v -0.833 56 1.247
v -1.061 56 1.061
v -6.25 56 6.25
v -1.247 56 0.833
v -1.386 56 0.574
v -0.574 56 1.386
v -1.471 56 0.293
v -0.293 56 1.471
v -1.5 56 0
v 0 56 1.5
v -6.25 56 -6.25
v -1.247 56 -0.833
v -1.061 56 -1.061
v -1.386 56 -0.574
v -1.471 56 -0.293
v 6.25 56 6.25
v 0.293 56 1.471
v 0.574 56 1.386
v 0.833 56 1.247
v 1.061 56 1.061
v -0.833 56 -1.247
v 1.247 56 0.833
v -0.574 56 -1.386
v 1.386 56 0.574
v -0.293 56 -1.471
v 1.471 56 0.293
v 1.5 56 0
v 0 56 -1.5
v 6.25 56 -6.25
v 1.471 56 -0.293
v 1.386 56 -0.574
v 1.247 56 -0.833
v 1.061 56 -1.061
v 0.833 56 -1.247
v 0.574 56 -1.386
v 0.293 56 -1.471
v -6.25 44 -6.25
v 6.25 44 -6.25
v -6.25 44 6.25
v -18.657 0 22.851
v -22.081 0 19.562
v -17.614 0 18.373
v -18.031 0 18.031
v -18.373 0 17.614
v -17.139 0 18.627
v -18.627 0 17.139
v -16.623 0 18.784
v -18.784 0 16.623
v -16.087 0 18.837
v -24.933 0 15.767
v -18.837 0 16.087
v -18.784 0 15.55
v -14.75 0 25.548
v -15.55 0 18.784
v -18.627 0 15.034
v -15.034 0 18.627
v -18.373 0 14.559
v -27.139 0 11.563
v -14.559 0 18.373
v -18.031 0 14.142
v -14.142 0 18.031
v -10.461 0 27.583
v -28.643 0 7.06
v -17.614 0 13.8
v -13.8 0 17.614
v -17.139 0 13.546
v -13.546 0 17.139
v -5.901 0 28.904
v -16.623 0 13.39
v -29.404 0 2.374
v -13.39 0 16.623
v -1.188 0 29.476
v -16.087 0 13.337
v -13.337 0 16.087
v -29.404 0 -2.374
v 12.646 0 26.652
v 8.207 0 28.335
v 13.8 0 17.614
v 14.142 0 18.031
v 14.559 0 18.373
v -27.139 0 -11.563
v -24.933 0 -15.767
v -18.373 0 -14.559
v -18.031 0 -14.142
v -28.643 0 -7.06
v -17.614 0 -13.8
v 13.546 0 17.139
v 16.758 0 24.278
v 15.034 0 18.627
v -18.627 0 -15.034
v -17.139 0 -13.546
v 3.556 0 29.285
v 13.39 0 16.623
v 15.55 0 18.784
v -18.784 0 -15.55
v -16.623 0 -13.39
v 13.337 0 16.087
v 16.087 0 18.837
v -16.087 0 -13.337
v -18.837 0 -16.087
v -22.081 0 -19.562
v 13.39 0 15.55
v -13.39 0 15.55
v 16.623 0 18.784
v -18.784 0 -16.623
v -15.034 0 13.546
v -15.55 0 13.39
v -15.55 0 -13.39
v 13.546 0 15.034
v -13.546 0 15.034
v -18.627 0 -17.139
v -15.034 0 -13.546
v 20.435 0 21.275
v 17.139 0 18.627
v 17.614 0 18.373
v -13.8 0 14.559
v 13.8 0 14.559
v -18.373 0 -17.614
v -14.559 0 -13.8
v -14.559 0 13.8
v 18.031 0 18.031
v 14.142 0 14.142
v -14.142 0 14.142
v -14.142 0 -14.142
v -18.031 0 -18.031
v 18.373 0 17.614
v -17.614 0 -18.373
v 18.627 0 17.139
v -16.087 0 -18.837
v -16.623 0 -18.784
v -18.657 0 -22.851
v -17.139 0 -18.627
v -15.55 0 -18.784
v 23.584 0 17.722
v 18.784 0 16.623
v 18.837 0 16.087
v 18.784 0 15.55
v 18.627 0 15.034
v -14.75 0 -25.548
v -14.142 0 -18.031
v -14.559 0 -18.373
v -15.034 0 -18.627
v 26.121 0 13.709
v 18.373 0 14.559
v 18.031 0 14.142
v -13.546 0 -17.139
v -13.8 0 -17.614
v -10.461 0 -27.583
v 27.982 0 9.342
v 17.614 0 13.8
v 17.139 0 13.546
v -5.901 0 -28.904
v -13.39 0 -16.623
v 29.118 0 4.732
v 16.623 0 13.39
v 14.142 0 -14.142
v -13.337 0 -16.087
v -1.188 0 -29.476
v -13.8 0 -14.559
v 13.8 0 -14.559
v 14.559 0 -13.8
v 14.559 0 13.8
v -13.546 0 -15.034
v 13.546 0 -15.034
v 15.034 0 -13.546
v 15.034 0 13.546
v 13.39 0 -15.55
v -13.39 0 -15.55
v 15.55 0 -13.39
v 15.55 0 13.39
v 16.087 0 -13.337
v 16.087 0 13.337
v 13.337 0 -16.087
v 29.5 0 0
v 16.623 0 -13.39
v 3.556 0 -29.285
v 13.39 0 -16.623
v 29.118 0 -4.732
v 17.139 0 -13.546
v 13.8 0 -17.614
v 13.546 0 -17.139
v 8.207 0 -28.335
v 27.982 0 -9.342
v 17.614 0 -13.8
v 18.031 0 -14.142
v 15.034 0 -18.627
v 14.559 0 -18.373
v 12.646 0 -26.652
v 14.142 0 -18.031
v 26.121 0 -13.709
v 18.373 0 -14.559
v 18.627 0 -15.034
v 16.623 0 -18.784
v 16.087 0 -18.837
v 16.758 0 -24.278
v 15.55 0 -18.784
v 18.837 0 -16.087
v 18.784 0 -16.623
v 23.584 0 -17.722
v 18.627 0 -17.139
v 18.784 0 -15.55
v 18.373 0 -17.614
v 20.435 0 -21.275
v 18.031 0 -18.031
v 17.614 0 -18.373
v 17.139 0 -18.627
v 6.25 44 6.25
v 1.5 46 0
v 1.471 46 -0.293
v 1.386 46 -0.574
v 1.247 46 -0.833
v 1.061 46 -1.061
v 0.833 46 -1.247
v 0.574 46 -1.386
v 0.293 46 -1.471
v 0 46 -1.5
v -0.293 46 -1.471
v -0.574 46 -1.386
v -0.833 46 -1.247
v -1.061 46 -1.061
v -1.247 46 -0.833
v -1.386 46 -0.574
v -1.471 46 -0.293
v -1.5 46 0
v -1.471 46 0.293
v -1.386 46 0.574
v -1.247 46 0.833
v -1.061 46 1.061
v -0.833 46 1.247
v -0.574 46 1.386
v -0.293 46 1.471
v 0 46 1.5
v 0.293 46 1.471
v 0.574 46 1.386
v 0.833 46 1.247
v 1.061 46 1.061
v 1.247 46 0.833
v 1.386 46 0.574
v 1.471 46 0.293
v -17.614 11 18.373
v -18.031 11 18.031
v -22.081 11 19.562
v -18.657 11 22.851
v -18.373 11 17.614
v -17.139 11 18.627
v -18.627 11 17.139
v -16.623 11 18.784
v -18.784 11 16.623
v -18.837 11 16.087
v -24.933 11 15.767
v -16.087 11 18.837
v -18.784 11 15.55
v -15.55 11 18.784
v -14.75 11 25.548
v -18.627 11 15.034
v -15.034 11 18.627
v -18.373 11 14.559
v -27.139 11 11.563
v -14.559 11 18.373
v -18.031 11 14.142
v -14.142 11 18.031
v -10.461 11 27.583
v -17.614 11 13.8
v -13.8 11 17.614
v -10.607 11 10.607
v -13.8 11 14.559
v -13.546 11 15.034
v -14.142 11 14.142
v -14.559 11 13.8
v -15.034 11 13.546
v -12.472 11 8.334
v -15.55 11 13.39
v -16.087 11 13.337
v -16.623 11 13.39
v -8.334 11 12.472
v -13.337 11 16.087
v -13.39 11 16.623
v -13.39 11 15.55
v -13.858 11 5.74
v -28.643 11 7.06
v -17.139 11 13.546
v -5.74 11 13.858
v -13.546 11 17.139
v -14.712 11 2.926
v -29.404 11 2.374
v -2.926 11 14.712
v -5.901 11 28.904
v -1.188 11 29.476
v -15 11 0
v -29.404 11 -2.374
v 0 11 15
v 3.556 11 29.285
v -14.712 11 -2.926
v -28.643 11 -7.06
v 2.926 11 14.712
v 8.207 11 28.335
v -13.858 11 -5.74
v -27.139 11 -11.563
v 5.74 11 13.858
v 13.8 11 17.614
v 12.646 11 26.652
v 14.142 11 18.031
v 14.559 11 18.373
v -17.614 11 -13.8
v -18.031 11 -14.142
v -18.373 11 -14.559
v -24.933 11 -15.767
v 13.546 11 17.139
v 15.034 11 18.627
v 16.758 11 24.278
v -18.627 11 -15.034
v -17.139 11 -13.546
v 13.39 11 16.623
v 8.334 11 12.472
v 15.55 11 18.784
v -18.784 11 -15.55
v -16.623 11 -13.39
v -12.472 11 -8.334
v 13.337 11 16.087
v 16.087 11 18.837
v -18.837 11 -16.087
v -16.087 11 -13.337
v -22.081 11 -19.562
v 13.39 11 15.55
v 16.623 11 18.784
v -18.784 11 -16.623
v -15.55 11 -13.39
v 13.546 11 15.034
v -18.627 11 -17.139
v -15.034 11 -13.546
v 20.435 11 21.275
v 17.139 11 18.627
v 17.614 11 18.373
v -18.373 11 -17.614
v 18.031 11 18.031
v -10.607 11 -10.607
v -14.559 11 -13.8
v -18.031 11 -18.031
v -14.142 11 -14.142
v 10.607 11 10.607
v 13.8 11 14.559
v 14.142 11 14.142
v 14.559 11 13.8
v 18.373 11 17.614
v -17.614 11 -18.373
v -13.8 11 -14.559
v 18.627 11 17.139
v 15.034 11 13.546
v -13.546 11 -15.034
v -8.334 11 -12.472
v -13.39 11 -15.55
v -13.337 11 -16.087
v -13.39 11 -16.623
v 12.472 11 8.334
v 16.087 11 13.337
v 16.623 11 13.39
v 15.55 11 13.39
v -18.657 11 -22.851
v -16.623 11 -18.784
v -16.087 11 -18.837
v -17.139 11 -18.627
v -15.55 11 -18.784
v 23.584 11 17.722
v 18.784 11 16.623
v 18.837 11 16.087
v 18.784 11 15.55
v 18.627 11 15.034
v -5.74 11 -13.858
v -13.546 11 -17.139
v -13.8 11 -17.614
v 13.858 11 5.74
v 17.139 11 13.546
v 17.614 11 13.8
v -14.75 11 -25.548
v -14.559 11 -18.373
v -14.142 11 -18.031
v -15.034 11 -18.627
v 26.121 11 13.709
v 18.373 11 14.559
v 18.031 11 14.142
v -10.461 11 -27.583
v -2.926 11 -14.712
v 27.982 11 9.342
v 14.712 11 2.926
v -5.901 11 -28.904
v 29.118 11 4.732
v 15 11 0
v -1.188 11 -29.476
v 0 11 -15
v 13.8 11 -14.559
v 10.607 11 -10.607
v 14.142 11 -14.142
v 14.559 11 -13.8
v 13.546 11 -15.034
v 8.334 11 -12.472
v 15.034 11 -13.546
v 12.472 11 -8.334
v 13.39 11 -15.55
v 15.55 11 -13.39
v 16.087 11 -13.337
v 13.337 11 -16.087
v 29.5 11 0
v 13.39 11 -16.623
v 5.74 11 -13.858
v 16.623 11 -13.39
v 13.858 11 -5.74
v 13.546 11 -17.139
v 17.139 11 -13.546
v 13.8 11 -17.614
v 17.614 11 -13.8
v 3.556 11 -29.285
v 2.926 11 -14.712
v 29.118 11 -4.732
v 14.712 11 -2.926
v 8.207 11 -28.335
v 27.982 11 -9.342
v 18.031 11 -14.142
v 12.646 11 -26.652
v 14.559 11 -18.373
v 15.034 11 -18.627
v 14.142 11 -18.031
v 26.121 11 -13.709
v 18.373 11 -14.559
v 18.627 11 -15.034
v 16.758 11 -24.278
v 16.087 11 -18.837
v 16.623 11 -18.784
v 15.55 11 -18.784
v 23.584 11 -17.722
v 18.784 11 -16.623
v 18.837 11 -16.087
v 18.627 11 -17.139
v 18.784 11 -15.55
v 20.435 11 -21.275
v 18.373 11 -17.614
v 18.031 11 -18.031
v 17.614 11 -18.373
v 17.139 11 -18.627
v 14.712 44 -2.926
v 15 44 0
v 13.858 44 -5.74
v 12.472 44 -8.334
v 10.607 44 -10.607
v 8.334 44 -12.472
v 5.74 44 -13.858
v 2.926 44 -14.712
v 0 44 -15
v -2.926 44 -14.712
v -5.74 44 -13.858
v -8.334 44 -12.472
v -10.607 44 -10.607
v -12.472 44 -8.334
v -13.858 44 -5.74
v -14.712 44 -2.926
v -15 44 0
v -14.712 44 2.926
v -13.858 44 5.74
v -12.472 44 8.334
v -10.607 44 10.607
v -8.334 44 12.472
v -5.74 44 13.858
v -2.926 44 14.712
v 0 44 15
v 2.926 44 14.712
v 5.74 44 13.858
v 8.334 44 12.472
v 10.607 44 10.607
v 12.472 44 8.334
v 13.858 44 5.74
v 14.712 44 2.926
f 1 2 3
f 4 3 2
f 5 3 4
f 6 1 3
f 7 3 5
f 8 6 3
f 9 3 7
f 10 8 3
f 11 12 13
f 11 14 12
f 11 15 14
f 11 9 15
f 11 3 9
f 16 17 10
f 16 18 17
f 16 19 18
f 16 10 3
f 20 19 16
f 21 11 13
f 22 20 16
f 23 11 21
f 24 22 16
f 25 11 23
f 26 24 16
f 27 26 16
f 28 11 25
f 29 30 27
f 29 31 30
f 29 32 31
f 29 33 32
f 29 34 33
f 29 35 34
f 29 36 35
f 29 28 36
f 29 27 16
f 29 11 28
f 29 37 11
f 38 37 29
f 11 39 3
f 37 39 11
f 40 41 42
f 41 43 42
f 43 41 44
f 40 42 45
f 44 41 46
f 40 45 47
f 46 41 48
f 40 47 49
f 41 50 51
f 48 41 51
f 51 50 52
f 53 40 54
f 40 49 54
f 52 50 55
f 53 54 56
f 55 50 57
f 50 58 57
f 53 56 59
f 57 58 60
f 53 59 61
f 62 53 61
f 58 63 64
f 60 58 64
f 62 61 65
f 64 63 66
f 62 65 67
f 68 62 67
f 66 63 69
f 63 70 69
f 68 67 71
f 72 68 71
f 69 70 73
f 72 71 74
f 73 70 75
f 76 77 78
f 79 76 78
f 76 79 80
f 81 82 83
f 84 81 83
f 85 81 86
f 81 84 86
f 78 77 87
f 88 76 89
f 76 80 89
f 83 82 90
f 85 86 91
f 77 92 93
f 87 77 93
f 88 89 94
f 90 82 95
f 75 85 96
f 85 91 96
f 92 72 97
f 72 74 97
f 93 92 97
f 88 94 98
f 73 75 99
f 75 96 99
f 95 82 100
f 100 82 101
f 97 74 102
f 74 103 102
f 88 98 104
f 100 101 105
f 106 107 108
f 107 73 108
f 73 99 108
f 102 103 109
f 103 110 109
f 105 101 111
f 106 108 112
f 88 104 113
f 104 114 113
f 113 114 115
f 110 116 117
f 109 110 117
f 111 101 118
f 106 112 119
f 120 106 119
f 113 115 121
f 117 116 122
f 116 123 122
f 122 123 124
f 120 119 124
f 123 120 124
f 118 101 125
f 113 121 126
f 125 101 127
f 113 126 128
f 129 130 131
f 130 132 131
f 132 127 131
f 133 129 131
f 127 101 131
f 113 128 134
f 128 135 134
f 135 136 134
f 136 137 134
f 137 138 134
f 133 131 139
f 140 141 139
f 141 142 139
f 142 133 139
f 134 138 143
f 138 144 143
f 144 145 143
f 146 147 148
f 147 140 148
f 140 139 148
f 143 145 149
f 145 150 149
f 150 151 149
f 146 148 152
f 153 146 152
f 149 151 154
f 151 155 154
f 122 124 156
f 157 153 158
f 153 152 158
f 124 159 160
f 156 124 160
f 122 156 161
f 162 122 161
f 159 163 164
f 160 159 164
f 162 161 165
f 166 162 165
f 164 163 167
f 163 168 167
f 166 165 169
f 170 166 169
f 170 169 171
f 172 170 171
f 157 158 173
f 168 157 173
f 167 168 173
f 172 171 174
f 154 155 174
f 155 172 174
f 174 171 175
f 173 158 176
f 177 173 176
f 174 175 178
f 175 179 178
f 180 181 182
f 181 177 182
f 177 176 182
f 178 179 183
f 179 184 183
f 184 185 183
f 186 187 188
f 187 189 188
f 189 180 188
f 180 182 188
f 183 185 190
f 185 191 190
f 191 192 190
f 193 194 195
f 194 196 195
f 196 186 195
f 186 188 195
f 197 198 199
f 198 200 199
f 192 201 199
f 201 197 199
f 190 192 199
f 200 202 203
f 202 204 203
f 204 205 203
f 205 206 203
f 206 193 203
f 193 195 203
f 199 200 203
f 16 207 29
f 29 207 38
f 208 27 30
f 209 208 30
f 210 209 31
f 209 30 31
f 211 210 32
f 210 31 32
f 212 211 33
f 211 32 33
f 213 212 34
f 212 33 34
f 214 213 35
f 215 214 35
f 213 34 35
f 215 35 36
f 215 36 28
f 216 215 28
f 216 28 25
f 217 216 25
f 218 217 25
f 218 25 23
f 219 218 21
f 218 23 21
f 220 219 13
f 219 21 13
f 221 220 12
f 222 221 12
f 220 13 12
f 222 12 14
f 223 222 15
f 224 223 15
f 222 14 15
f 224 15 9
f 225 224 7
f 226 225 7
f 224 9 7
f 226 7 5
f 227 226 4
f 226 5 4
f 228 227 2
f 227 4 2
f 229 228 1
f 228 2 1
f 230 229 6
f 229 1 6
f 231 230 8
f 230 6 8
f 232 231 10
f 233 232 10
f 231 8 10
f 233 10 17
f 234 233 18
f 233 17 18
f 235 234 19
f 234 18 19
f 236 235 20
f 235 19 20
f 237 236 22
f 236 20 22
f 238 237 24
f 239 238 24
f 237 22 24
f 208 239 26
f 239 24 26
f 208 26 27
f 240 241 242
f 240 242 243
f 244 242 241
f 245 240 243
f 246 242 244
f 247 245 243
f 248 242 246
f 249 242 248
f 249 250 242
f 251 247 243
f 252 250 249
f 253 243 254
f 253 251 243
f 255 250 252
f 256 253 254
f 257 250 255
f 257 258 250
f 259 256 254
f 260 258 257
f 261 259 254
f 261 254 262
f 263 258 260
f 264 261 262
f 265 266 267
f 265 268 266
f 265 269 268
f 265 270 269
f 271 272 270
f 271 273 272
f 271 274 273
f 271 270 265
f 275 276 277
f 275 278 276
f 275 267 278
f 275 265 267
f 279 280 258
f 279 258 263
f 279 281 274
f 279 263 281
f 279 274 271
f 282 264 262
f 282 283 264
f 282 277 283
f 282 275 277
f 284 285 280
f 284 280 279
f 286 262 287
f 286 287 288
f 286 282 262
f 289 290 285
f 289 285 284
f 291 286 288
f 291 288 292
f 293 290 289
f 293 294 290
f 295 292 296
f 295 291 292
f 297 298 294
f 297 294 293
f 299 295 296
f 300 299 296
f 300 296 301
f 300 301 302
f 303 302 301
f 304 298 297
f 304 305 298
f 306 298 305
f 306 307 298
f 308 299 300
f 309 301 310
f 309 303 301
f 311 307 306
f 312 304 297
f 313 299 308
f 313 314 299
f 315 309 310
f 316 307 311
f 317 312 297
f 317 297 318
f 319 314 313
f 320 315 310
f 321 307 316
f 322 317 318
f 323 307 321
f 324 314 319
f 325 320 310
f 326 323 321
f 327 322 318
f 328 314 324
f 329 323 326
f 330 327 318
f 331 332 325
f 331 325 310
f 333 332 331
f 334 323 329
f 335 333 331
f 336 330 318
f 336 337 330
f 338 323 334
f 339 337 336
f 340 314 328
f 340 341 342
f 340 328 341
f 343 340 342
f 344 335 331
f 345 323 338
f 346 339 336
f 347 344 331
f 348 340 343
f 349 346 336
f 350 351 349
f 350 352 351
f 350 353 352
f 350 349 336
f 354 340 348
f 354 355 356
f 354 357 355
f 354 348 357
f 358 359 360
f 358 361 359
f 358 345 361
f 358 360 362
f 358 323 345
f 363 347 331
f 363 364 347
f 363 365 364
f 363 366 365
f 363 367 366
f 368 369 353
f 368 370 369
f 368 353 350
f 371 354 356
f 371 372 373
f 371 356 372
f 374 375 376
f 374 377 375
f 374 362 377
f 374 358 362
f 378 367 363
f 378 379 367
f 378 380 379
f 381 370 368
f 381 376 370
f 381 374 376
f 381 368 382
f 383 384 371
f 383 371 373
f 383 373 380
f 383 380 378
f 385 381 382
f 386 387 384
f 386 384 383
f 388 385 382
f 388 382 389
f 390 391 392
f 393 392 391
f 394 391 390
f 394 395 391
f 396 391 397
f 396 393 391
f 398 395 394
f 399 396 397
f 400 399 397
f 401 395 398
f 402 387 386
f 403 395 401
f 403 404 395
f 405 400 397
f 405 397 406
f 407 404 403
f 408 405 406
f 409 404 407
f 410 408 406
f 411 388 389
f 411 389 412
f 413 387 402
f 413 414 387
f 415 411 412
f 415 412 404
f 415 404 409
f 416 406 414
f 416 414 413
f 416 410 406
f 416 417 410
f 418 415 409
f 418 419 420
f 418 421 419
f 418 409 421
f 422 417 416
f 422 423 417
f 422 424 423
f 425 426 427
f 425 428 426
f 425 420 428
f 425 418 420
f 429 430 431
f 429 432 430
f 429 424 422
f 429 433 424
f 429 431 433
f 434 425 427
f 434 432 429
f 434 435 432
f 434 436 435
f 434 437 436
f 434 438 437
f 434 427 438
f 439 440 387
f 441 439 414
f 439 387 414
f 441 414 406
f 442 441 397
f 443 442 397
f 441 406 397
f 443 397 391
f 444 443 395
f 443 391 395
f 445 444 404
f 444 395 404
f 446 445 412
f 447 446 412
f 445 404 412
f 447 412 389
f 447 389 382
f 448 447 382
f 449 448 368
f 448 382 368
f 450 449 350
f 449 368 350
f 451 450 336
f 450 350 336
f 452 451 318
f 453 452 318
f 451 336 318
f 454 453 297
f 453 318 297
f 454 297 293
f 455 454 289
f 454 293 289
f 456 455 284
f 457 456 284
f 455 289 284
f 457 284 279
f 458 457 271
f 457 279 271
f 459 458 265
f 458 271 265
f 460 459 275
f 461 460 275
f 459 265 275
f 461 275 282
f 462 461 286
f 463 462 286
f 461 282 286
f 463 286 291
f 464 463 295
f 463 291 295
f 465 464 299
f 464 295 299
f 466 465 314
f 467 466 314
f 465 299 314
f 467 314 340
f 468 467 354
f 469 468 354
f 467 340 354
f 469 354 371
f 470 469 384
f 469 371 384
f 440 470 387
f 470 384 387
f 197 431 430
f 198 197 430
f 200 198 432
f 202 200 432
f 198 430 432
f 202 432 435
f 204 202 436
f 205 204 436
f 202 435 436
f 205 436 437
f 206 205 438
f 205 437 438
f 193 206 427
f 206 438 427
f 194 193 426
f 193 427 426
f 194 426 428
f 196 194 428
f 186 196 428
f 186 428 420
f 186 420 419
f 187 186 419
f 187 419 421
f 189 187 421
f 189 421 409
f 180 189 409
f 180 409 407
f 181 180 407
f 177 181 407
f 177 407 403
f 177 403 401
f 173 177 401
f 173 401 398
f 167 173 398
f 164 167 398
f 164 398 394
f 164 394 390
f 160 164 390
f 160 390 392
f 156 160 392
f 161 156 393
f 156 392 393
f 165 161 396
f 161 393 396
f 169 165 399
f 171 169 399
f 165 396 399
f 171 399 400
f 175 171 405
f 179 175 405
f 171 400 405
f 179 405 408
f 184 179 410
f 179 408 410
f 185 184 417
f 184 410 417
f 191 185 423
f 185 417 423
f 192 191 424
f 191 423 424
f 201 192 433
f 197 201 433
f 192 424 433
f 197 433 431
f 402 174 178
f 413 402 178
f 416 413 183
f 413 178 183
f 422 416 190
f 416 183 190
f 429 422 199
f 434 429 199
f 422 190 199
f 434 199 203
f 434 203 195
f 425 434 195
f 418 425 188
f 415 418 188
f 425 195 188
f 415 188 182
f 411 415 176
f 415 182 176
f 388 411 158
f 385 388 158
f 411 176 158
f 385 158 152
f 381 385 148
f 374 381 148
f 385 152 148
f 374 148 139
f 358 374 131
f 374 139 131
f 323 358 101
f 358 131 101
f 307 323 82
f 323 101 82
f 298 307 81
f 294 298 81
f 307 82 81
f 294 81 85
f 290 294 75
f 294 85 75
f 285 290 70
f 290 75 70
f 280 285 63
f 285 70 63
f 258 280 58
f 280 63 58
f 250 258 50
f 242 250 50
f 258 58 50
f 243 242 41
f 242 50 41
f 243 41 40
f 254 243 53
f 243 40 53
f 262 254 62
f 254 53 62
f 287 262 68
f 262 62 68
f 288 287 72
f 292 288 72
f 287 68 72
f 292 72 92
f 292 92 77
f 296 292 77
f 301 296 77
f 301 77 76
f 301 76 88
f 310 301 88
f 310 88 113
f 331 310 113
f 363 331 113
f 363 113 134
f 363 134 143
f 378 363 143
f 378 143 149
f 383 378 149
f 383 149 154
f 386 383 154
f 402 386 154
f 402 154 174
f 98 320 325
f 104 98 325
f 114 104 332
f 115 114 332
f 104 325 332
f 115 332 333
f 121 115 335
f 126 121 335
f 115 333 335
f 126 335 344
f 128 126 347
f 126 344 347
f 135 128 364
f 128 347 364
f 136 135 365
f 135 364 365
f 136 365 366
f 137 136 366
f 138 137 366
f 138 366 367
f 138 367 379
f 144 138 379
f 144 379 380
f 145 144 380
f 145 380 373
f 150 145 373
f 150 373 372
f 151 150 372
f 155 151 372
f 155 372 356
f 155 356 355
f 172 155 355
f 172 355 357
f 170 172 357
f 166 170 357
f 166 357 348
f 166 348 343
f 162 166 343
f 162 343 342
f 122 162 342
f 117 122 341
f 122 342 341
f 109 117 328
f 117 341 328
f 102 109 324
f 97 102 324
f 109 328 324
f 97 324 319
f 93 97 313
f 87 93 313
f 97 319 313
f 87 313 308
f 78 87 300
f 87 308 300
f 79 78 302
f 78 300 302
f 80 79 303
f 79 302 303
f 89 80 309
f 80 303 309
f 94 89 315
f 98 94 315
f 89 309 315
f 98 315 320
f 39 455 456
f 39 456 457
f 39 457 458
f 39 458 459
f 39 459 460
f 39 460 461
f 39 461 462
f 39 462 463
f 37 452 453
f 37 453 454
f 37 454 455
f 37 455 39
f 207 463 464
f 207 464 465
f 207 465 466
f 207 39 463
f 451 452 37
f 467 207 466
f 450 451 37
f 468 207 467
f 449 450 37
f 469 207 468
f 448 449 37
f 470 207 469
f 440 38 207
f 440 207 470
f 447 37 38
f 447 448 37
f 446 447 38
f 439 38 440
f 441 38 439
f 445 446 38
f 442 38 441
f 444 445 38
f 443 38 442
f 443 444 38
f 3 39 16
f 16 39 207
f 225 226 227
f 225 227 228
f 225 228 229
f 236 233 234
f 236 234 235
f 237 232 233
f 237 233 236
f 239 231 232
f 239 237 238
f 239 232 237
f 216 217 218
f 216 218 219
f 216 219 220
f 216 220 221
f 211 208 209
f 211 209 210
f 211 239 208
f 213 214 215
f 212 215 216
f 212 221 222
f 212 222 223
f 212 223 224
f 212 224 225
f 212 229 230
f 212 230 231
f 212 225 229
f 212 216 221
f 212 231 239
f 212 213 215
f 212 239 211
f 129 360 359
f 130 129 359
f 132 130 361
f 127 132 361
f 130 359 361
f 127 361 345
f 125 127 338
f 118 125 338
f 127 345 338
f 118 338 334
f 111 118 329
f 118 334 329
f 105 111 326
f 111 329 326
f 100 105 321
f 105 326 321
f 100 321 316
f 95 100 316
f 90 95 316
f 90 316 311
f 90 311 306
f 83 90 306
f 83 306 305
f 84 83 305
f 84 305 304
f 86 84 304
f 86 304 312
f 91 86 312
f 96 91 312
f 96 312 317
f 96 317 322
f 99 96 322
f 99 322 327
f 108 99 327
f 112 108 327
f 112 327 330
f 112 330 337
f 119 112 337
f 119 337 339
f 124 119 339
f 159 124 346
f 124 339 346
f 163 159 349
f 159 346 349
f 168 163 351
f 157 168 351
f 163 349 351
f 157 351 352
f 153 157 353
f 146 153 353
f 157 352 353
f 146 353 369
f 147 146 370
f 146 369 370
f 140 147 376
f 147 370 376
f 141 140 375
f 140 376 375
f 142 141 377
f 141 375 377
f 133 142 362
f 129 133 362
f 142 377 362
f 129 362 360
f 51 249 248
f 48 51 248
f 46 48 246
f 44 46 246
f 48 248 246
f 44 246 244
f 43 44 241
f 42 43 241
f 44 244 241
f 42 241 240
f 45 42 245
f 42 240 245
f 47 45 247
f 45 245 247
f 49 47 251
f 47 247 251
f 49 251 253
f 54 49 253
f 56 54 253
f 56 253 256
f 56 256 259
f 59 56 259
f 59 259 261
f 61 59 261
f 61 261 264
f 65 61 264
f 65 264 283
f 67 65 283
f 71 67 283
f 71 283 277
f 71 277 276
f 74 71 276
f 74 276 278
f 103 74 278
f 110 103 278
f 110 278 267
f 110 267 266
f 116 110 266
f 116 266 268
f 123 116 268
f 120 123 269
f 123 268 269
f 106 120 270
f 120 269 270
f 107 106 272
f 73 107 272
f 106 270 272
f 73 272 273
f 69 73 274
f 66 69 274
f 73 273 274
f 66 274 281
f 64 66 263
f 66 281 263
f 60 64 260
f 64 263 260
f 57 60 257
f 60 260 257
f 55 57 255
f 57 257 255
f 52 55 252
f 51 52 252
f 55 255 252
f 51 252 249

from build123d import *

# Parameters (mm, degrees)
SKETCH_1_R               = 29.5
EXTRUDE_1_DEPTH          = 11
SKETCH_2_R               = 15
EXTRUDE_2_DEPTH          = 33
SKETCH_3_W               = 12.5
SKETCH_3_H               = 12.5
EXTRUDE_3_DEPTH          = 12
SKETCH_4_R               = 2.75
CUT_EXTRUDE_1_DEPTH      = 12
PATTERN_CIRCULAR_1_COUNT = 4
SKETCH_5_R               = 1.5
CUT_EXTRUDE_2_DEPTH      = 10


with BuildPart() as part:
    # 草图1 → 凸台-拉伸1 (new body)
    with BuildSketch(Plane(origin=(0, 0, 0), x_dir=(1, 0, 0), z_dir=(0, 1, 0))):
        Circle(SKETCH_1_R)
    extrude(amount=EXTRUDE_1_DEPTH)

    # 草图2 → 凸台-拉伸2 (add)
    with BuildSketch(Plane(origin=(0, 11, 0), x_dir=(1, 0, 0), z_dir=(0, 1, 0))):
        Circle(SKETCH_2_R)
    extrude(amount=EXTRUDE_2_DEPTH)

    # 草图3 → 凸台-拉伸3 (add)
    with BuildSketch(Plane(origin=(0, 44, 0), x_dir=(1, 0, 0), z_dir=(0, 1, 0))):
        Rectangle(SKETCH_3_W, SKETCH_3_H)
    extrude(amount=EXTRUDE_3_DEPTH)

    # 草图4 → 切除-拉伸1 (cut)
    with BuildSketch(Plane(origin=(0, 11, 0), x_dir=(1, 0, 0), z_dir=(0, 1, 0))):
        with Locations((16.086679272, 16.086679272)):
            Circle(SKETCH_4_R)
    cut_extrude_1 = extrude(amount=-CUT_EXTRUDE_1_DEPTH, mode=Mode.SUBTRACT)

    # 阵列(圆周)1: 切除-拉伸1 ×4 about axis
    pattern_circular_1_axis = Axis((0, 0, 0), (0, 1, 0))
    for i in range(1, PATTERN_CIRCULAR_1_COUNT):
        add(cut_extrude_1.rotate(pattern_circular_1_axis, i * 360 / PATTERN_CIRCULAR_1_COUNT), mode=Mode.SUBTRACT)

    # 草图5 → 切除-拉伸2 (cut)
    with BuildSketch(Plane(origin=(0, 56, 0), x_dir=(1, 0, 0), z_dir=(0, 1, 0))):
        Circle(SKETCH_5_R)
    extrude(amount=-CUT_EXTRUDE_2_DEPTH, mode=Mode.SUBTRACT)


solid = part.part
